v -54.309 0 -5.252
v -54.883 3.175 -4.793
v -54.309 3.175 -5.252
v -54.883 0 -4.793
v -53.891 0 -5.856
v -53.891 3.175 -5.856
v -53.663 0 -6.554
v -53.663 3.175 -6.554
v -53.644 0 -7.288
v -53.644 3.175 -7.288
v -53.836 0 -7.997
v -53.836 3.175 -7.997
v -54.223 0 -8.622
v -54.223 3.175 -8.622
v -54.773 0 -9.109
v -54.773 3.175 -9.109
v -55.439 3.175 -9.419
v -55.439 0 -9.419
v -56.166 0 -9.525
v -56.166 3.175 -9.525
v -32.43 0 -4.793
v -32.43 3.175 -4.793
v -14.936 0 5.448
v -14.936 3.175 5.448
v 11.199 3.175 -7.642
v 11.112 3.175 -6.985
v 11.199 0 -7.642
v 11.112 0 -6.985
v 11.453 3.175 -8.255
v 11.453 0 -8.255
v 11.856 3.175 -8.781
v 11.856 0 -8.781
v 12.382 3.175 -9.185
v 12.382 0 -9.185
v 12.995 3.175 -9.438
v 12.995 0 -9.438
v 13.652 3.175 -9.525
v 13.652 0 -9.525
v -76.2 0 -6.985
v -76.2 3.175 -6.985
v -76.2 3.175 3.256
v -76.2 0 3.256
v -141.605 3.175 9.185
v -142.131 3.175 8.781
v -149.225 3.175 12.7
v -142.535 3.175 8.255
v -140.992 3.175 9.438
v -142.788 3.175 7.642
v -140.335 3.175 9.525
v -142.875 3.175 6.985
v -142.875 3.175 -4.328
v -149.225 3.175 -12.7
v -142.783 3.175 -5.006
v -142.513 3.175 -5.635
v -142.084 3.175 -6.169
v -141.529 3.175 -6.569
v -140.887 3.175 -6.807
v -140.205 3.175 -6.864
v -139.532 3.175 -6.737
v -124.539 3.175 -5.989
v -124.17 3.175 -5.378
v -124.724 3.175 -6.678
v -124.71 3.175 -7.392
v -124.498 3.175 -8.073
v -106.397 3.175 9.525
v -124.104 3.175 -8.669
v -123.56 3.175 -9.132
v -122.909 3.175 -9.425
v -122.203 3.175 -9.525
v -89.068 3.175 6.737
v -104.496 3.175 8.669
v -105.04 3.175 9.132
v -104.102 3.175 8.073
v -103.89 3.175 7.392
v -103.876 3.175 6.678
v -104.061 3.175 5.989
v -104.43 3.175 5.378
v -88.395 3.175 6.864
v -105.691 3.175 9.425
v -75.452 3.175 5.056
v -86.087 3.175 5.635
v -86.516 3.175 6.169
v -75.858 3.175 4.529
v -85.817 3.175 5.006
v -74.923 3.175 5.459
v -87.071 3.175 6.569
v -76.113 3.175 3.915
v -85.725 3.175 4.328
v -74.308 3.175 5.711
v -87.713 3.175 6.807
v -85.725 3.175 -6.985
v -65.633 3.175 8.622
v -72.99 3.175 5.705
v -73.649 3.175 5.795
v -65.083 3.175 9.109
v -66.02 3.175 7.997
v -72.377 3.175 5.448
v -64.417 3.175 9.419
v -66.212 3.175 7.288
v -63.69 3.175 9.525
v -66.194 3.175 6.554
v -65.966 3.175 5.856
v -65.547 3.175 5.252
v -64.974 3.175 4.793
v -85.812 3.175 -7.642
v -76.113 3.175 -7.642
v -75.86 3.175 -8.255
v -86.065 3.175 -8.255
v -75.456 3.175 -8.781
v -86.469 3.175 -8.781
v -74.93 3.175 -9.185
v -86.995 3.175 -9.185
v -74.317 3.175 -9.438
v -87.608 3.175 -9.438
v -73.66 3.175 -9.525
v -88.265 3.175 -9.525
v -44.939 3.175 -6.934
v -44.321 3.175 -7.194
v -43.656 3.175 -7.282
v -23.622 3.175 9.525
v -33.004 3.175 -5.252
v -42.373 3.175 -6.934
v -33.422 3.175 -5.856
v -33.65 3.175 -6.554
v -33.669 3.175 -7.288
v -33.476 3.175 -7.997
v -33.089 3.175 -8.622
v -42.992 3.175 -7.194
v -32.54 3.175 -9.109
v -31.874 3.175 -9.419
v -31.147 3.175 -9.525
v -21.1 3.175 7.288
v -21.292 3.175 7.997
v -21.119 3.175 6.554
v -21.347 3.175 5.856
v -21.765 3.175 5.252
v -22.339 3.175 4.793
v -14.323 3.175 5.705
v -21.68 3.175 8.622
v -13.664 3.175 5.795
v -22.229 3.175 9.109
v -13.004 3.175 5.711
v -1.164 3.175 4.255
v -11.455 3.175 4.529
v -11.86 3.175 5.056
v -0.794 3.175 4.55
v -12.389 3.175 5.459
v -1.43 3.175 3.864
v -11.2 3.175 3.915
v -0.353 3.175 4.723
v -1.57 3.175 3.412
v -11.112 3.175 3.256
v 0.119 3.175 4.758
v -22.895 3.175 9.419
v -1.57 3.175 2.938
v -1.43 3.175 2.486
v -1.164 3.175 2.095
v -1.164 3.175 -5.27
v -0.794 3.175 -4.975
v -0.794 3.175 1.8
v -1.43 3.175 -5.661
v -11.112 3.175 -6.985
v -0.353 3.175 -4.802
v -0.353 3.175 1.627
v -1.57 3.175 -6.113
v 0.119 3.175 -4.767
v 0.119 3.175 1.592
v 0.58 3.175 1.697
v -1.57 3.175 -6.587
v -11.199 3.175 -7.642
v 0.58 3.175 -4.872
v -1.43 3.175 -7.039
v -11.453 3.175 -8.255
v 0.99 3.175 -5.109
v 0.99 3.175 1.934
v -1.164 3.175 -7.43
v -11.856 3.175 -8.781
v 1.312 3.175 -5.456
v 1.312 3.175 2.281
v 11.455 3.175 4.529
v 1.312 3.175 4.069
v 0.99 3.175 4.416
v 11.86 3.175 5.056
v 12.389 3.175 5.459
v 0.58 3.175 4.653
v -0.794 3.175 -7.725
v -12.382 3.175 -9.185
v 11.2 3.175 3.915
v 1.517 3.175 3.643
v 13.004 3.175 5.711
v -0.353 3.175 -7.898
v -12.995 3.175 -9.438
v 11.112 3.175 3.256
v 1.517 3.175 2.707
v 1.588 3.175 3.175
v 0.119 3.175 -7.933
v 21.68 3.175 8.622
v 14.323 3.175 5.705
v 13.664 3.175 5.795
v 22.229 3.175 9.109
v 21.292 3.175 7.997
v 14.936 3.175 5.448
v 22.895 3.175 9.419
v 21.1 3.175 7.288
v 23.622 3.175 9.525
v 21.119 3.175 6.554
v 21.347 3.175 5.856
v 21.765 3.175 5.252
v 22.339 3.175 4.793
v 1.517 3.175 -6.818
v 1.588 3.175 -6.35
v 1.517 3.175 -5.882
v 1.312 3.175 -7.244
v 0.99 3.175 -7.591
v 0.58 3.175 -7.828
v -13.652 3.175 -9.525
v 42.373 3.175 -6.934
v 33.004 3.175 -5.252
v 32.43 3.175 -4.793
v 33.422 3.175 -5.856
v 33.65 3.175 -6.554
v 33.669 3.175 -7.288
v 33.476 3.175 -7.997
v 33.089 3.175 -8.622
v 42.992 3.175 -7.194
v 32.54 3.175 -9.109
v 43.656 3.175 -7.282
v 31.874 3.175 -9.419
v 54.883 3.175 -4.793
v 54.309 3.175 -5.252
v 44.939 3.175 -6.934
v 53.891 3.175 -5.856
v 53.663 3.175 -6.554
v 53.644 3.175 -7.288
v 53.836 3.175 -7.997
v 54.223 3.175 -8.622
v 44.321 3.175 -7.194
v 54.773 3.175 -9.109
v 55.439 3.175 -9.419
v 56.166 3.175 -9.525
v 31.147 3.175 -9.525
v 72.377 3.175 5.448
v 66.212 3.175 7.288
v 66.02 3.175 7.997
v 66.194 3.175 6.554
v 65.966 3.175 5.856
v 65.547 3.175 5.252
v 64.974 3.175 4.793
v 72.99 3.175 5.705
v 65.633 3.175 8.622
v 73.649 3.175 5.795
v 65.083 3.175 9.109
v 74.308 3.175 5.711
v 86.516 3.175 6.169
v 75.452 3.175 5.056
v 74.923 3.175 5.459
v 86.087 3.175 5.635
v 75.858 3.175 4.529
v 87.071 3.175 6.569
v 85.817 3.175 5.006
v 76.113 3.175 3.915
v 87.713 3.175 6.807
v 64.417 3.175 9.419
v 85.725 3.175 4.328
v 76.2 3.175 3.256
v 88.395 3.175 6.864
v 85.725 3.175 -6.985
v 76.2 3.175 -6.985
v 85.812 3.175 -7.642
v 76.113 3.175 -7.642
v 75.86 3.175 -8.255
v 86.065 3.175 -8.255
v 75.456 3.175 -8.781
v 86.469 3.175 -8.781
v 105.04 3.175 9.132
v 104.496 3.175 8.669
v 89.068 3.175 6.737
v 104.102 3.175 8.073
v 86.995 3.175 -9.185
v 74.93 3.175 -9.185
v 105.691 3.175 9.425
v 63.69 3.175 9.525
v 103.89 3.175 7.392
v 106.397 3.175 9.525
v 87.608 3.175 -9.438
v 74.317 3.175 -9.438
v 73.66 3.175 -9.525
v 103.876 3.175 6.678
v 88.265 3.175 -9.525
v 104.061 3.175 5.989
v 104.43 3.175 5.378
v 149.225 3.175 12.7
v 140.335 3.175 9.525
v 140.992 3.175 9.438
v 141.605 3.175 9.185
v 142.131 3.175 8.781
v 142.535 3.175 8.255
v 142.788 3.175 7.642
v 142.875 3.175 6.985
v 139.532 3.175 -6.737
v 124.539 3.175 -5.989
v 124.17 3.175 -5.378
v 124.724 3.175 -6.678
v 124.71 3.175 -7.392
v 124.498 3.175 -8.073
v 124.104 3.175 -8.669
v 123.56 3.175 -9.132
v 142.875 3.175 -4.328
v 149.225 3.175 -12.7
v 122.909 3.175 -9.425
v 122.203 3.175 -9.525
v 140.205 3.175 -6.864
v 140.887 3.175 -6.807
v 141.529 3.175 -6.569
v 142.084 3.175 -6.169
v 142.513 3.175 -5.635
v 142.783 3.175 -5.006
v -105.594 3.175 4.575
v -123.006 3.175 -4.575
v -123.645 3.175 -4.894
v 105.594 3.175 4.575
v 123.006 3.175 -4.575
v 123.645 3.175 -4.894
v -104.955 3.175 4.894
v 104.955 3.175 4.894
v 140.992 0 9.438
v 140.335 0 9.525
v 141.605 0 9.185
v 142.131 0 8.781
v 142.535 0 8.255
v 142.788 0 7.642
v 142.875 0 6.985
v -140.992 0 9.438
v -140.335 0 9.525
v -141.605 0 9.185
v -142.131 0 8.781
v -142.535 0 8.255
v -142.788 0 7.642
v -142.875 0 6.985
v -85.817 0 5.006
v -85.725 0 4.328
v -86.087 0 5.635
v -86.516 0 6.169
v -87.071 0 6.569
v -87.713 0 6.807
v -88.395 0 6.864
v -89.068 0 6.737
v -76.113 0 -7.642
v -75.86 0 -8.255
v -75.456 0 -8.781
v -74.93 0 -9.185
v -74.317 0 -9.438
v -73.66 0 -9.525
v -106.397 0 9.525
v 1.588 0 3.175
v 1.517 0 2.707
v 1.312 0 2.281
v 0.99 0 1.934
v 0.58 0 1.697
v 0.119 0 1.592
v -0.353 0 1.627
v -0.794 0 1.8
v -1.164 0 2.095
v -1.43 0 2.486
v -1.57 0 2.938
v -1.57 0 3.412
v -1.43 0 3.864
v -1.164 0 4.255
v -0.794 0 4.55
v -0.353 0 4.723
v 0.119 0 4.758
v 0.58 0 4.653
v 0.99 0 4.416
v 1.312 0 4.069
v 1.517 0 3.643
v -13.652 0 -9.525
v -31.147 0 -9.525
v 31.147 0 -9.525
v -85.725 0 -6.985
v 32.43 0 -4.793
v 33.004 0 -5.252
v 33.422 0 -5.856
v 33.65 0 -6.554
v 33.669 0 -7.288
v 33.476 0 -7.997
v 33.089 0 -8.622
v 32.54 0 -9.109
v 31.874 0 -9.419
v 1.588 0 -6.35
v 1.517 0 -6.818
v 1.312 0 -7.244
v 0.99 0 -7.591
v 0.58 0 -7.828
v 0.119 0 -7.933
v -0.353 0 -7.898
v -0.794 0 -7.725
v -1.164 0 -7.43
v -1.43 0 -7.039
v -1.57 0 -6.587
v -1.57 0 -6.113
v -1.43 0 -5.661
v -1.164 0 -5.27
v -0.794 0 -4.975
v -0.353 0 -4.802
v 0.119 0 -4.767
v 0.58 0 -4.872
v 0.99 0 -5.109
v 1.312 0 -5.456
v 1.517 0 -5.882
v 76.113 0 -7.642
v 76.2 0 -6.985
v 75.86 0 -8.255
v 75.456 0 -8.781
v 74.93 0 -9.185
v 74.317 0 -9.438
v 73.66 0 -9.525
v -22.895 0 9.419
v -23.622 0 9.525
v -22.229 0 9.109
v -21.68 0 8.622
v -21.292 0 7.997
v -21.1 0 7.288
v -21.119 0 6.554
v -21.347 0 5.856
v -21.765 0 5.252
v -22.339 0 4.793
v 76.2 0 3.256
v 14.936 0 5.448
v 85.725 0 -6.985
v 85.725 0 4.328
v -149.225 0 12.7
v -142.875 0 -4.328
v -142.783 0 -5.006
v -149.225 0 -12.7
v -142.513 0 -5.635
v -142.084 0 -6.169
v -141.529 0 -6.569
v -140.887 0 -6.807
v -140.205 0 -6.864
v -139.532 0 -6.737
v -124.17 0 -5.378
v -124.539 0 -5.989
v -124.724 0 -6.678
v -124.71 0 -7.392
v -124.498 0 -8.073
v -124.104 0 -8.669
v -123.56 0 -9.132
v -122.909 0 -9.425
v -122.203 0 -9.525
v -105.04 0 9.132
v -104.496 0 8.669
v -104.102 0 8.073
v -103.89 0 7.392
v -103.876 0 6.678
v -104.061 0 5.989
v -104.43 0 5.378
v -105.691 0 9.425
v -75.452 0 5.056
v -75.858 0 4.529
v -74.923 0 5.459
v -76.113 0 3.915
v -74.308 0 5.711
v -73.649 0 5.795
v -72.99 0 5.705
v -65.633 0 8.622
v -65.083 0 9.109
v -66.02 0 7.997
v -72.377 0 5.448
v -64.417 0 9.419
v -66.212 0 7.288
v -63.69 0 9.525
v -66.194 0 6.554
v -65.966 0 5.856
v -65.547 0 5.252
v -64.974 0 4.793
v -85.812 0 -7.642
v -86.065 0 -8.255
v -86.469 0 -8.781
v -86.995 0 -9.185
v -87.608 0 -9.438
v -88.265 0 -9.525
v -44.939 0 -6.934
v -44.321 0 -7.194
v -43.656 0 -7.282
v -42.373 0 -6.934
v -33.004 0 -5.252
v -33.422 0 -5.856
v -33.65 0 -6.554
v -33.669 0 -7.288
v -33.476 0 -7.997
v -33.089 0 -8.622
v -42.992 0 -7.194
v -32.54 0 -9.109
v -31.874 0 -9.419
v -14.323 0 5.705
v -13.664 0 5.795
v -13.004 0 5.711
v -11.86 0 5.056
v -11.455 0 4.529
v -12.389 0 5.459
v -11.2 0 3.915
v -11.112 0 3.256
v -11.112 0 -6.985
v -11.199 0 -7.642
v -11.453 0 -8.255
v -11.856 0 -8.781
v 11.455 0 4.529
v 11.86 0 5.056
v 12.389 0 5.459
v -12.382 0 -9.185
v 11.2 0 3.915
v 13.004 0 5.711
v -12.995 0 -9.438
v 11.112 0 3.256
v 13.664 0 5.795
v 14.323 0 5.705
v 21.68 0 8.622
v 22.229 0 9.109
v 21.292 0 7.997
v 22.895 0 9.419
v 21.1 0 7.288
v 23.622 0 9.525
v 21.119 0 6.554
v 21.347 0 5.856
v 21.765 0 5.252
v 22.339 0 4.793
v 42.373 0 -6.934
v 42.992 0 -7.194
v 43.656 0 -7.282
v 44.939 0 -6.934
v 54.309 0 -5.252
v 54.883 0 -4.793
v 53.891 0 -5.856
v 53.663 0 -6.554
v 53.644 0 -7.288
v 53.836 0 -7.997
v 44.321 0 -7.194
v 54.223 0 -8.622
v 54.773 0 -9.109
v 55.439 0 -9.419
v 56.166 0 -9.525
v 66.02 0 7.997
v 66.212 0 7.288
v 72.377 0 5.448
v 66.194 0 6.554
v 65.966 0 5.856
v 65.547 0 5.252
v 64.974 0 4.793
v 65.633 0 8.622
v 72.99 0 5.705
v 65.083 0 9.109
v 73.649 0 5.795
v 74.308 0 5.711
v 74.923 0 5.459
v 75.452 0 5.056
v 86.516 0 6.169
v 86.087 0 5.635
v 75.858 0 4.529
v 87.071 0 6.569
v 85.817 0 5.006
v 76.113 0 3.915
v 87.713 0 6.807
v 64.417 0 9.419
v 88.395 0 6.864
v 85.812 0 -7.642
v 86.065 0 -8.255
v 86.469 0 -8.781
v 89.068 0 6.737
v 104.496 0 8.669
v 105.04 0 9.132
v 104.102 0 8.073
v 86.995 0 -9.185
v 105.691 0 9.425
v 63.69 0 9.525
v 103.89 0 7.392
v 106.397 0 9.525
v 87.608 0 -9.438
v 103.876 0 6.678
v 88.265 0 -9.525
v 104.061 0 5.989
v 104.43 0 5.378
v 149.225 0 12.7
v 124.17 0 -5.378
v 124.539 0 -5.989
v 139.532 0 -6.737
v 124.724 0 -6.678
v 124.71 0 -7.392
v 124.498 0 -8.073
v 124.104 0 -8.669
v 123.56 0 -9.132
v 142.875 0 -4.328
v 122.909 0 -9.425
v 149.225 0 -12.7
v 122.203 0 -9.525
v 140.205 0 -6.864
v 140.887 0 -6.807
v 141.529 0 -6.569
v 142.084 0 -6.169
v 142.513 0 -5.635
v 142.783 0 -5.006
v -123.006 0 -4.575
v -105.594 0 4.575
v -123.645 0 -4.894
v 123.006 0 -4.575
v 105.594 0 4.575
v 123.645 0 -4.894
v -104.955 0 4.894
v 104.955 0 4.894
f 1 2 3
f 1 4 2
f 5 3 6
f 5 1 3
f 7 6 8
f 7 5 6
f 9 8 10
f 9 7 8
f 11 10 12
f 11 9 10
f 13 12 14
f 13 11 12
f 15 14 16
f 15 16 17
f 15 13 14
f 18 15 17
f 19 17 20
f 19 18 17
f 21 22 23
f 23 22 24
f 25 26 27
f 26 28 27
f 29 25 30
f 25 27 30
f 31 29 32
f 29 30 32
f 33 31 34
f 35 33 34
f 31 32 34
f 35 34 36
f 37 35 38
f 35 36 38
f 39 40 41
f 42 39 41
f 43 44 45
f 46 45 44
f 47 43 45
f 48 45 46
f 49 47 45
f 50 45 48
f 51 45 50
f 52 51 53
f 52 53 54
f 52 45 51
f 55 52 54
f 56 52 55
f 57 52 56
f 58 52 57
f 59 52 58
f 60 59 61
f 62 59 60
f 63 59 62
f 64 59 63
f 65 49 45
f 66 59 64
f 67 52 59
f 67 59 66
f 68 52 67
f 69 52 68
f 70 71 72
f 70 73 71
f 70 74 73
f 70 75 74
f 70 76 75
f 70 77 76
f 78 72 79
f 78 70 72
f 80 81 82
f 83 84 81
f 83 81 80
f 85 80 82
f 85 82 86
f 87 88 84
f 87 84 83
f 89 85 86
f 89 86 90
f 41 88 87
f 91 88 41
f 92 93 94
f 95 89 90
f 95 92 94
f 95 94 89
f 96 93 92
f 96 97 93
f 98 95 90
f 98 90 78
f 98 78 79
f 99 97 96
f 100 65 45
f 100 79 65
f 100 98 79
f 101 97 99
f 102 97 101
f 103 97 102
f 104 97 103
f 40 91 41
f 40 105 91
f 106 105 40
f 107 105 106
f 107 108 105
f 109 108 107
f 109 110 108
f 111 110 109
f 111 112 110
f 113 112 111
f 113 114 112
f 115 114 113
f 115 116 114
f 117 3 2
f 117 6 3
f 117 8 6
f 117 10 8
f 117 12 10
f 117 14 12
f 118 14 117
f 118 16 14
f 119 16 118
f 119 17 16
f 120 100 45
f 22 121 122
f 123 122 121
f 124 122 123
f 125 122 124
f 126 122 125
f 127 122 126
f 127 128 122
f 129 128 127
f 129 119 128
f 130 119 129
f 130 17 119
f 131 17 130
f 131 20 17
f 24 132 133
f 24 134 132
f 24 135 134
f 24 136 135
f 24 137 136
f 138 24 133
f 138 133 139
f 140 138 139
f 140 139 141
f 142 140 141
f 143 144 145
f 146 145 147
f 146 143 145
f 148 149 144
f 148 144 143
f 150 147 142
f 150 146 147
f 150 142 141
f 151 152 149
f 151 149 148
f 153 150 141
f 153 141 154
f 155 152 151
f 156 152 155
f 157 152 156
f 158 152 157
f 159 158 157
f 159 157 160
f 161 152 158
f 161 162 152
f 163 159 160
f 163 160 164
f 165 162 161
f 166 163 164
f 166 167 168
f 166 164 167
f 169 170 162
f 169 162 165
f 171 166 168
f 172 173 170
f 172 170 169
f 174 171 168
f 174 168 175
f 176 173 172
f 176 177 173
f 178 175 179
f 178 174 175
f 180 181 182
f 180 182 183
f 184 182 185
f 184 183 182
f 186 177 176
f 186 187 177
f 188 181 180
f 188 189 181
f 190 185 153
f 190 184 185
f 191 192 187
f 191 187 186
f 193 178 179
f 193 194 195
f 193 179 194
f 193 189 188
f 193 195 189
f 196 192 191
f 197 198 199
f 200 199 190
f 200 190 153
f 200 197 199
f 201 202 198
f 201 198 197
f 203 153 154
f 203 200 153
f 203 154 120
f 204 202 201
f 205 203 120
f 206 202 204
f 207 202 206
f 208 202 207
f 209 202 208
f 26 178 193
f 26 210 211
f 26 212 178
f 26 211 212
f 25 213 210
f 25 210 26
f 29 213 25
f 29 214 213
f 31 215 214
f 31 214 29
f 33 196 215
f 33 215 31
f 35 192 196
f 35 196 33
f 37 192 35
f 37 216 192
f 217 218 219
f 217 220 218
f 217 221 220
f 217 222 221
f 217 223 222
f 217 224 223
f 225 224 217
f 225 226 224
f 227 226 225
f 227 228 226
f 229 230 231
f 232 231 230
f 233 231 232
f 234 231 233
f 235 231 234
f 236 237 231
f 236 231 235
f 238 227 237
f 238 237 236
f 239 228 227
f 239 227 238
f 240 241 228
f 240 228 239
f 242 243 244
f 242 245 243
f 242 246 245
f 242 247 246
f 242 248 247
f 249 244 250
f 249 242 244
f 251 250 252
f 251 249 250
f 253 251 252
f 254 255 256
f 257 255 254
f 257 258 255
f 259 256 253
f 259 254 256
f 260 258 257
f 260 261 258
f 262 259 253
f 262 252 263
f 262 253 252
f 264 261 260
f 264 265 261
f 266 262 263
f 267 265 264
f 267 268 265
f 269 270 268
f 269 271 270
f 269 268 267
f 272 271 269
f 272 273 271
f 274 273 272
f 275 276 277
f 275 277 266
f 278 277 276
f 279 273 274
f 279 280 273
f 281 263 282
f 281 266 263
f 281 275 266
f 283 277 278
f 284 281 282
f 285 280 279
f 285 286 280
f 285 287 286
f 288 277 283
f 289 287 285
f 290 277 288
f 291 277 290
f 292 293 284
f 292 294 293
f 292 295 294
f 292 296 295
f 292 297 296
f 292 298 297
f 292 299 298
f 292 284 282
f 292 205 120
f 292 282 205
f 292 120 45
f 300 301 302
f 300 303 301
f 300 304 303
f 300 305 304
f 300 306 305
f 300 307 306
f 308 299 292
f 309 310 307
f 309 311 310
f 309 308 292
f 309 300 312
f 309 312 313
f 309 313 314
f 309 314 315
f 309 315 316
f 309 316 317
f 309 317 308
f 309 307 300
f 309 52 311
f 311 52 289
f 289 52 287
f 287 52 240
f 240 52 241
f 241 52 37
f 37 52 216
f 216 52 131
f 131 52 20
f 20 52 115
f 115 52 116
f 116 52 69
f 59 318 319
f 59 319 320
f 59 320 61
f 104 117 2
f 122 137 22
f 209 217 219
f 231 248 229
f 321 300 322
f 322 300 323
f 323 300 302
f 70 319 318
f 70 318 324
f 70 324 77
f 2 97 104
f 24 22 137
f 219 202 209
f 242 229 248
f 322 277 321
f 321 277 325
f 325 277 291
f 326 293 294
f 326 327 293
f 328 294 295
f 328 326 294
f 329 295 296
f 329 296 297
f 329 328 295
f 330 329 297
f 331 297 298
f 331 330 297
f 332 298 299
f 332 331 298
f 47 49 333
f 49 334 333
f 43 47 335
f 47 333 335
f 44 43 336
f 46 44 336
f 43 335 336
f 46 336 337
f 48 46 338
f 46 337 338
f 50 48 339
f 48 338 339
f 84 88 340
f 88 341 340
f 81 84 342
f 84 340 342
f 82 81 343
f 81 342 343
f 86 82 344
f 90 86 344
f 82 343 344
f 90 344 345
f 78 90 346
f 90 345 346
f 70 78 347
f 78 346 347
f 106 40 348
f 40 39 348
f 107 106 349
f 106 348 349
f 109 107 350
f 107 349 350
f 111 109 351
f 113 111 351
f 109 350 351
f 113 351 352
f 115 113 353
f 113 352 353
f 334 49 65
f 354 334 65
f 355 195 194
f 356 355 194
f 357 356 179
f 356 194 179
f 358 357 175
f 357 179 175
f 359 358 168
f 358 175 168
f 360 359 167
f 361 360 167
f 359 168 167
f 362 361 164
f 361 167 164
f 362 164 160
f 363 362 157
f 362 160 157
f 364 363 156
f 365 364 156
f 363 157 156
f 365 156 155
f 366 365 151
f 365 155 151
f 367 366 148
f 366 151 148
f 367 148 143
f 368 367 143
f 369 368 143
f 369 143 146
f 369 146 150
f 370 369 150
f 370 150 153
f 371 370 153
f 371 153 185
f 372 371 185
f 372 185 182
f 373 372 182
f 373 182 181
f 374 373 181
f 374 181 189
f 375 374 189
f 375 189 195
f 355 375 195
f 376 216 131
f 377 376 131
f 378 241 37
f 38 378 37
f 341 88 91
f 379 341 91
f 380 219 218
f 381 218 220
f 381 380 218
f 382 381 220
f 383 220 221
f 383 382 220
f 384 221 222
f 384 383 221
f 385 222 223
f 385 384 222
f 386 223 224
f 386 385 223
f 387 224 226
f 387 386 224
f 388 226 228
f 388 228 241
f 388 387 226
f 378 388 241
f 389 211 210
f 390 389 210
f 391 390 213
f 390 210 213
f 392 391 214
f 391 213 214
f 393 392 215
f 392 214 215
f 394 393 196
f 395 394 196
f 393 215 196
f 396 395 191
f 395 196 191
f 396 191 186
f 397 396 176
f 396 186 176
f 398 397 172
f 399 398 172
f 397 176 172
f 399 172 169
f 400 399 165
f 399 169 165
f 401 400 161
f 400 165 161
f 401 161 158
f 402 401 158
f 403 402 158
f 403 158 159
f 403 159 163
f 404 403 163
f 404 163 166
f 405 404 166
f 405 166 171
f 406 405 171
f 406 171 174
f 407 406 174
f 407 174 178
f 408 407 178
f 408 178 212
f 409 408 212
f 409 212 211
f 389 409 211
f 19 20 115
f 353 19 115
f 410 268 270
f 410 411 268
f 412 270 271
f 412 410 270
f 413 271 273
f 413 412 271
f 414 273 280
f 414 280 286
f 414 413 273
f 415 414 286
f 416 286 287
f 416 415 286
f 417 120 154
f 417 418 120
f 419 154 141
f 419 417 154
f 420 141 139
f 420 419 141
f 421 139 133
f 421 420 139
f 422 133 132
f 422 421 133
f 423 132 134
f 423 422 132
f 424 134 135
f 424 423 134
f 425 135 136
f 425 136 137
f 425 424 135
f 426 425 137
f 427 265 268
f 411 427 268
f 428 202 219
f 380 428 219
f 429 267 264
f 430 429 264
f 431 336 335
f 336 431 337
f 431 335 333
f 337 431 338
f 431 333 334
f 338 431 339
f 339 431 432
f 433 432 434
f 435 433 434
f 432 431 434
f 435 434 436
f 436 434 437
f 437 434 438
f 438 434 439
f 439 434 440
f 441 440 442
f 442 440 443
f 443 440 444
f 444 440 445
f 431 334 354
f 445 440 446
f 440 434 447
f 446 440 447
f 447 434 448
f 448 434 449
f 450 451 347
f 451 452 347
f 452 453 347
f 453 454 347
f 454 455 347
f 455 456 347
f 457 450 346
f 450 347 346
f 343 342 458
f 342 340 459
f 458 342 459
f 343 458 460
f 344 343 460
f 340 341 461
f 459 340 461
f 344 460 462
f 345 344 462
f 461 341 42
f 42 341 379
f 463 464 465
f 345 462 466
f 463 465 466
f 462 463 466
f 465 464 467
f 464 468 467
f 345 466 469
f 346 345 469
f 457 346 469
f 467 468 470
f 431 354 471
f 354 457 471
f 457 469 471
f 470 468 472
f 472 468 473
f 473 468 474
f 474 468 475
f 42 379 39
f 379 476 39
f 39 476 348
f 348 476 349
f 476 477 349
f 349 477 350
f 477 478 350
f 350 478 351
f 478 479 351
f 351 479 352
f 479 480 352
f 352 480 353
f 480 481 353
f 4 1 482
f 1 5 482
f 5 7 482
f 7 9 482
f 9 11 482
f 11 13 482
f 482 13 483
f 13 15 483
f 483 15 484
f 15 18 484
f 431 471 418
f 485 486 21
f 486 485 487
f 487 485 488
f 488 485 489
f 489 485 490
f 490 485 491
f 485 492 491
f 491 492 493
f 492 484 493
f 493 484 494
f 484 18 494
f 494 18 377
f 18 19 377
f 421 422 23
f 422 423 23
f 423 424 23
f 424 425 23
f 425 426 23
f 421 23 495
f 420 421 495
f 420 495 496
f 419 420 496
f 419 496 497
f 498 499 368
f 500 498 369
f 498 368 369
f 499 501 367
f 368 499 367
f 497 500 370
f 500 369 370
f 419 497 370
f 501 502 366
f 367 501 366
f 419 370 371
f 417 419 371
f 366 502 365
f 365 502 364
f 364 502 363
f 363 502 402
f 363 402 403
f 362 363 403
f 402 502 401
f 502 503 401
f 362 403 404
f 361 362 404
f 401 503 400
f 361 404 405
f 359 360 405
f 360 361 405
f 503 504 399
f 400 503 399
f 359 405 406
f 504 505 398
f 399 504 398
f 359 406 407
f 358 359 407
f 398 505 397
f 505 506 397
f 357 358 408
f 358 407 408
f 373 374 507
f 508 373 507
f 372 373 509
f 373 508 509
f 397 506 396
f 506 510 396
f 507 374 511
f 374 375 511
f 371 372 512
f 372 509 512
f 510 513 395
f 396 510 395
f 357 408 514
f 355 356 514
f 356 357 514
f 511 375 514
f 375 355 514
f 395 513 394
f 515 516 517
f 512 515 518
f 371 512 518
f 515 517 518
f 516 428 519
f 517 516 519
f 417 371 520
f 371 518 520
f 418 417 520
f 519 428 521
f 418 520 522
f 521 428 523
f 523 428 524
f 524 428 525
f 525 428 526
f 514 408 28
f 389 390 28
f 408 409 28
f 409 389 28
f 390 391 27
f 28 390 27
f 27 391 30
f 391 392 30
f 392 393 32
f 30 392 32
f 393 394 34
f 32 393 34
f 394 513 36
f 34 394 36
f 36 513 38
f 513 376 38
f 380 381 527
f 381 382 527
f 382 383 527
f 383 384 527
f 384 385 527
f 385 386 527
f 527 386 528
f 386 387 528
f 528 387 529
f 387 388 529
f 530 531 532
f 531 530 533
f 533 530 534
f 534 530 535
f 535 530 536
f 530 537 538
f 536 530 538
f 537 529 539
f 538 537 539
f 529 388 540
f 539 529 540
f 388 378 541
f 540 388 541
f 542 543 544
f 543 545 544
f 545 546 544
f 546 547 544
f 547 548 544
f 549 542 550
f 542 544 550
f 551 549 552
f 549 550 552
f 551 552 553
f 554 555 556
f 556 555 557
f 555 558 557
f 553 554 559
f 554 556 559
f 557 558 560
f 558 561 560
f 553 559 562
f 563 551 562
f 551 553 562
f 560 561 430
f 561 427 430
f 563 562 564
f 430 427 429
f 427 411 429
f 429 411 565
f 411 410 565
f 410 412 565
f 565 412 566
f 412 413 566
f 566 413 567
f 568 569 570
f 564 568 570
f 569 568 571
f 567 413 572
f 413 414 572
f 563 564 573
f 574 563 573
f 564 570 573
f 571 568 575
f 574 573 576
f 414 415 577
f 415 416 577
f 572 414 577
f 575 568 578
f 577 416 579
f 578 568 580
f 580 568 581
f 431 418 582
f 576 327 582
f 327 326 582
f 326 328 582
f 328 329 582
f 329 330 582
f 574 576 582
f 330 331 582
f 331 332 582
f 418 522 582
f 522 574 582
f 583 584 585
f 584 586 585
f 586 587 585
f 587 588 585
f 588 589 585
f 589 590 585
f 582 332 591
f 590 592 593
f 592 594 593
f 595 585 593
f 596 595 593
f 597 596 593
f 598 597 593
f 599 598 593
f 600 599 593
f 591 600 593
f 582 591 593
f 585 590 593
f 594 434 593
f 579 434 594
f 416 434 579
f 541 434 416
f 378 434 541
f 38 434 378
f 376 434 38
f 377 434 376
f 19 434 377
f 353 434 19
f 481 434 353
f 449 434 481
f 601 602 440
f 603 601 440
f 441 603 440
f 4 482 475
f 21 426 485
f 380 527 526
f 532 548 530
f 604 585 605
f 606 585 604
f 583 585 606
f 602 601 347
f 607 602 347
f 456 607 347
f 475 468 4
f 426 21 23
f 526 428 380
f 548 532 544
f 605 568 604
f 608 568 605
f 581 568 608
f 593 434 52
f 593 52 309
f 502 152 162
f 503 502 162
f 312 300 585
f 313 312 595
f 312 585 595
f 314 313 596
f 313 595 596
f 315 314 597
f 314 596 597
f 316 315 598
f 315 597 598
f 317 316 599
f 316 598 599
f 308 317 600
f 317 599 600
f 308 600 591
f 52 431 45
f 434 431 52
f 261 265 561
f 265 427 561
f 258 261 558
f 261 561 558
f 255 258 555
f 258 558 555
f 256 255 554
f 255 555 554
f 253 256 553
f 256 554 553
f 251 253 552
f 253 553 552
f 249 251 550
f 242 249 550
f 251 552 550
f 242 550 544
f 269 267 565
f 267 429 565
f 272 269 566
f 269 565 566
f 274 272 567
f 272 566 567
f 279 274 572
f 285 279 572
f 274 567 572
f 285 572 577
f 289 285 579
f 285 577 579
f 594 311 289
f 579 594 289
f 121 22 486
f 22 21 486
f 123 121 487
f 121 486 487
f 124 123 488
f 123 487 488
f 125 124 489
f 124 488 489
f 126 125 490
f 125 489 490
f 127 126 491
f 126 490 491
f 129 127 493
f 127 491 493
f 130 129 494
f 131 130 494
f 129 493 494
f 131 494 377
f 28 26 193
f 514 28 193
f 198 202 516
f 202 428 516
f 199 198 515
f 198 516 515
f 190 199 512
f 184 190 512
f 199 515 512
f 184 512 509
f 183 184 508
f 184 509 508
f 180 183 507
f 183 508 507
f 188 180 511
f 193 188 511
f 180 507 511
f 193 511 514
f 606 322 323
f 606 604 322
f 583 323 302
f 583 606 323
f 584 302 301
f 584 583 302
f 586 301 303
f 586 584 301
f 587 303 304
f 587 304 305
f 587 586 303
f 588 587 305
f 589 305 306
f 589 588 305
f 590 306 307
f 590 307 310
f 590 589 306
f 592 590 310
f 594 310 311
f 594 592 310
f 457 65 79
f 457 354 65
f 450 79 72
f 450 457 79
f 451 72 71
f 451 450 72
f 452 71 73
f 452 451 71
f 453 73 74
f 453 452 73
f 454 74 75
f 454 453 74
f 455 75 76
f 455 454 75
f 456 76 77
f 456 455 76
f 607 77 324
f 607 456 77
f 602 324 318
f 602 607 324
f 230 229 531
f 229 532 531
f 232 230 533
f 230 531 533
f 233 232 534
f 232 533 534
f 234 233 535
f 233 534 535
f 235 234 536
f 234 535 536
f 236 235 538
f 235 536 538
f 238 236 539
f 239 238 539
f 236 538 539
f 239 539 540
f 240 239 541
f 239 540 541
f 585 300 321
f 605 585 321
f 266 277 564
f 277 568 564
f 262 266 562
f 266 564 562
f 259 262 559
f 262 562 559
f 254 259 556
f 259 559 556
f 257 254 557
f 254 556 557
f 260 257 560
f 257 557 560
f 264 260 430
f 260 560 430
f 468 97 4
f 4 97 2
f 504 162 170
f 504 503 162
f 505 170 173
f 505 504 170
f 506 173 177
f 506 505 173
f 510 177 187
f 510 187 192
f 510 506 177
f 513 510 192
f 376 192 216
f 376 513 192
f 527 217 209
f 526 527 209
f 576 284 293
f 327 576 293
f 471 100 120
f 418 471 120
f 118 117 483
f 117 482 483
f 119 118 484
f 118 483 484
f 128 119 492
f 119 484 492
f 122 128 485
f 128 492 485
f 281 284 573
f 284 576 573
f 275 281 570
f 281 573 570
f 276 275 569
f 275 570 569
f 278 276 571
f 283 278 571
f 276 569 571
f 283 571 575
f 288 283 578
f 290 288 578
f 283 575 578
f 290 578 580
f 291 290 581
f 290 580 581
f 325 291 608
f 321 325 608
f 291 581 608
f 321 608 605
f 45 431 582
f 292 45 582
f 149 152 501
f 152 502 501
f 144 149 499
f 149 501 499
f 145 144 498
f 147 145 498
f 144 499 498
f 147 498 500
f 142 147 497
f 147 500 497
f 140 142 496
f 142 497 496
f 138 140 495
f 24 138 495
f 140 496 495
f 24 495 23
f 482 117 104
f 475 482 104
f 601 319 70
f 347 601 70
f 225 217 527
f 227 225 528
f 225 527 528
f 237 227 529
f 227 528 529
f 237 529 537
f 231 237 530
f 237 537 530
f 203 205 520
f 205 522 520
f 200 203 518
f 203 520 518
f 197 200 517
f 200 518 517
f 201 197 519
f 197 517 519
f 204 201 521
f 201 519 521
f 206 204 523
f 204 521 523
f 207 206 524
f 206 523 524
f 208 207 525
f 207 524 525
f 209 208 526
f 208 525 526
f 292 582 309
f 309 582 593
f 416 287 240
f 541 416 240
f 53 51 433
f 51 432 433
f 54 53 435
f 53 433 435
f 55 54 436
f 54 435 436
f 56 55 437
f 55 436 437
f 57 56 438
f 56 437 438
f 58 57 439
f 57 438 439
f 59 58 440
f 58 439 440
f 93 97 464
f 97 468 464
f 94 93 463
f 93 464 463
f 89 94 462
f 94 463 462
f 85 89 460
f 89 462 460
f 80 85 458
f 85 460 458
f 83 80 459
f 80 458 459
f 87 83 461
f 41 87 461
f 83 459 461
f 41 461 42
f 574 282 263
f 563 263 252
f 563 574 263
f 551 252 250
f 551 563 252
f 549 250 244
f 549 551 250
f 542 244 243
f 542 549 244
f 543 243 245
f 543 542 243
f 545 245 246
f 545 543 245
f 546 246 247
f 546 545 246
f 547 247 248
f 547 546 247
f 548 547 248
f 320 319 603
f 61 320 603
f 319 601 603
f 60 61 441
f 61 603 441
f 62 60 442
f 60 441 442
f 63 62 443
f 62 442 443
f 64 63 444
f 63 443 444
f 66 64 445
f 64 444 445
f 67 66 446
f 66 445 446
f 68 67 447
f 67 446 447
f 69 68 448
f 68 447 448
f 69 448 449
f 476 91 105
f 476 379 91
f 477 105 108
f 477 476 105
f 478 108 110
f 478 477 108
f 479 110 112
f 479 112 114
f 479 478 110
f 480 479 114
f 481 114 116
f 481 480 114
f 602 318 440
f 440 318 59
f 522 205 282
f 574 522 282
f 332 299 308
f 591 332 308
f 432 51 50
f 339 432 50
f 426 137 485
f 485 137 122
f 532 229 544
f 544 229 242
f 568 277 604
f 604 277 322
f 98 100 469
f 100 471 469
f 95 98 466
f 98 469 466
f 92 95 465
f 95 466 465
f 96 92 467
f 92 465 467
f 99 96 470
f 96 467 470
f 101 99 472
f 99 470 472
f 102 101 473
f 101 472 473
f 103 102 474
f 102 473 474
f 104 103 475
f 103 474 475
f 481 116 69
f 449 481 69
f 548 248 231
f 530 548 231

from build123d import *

# Parameters (mm, degrees)
SKETCH1_W           = 298.45
SKETCH1_H           = 25.4
BOSS_EXTRUDE1_DEPTH = 3.175
CUT_EXTRUDE1_DEPTH  = 4.175
SKETCH3_R           = 1.5875
CUT_EXTRUDE2_DEPTH  = 4.175
FILLET1_R           = 2.54


with BuildPart() as part:
    # Sketch1 → Boss-Extrude1 (new body)
    with BuildSketch(Plane(origin=(0, 0, 0), x_dir=(1, 0, 0), z_dir=(0, 1, 0))):
        Rectangle(SKETCH1_W, SKETCH1_H)
    extrude(amount=BOSS_EXTRUDE1_DEPTH)

    # Sketch2 → Cut-Extrude1 (cut, through all)
    with BuildSketch(Plane(origin=(0, 3.175, 0), x_dir=(1, 0, 0), z_dir=(0, 1, 0))):
        Polygon((-142.875, -9.525), (-90.745115786, -9.525), (-142.875, 7.851628071), align=None)
        Polygon((-85.725, -7.851628071), (-85.725, 9.525), (-137.854884214, 9.525), align=None)
        Polygon((-76.2, -7.685517516), (-46.798699244, 9.525), (-76.2, 9.525), align=None)
        Polygon((-73.057550756, -9.525), (-14.254949244, -9.525), (-43.65625, 7.685517516), align=None)
        Polygon((-11.1125, -7.685517516), (-11.1125, 9.525), (-40.513800756, 9.525), align=None)
        Polygon((11.1125, -7.685517516), (40.513800756, 9.525), (11.1125, 9.525), align=None)
        Polygon((14.254949244, -9.525), (73.057550756, -9.525), (43.65625, 7.685517516), align=None)
        Polygon((76.2, -7.685517516), (76.2, 9.525), (46.798699244, 9.525), align=None)
        Polygon((85.725, -7.851628071), (137.854884214, 9.525), (85.725, 9.525), align=None)
        Polygon((90.745115786, -9.525), (142.875, -9.525), (142.875, 7.851628071), align=None)
    extrude(amount=-CUT_EXTRUDE1_DEPTH, mode=Mode.SUBTRACT)

    # Sketch3 → Cut-Extrude2 (cut, through all)
    with BuildSketch(Plane(origin=(0, 3.175, 0), x_dir=(1, 0, 0), z_dir=(0, 1, 0))):
        with Locations((0, 6.35)):
            Circle(SKETCH3_R)
        with Locations((0, -3.175)):
            Circle(SKETCH3_R)
    extrude(amount=-CUT_EXTRUDE2_DEPTH, mode=Mode.SUBTRACT)

    # Fillet1
    fillet1_edges = [part.edges().sort_by_distance(p)[0] for p in [
        (-43.65625, 1.5875, -7.685517516),
        (-14.254949244, 1.5875, 9.525),
        (-73.057550756, 1.5875, 9.525),
        (-40.513800756, 1.5875, -9.525),
        (-11.1125, 1.5875, -9.525),
        (-11.1125, 1.5875, 7.685517516),
        (-76.2, 1.5875, 7.685517516),
        (-76.2, 1.5875, -9.525),
        (-46.798699244, 1.5875, -9.525),
        (-85.725, 1.5875, 7.851628071),
        (-137.854884214, 1.5875, -9.525),
        (-85.725, 1.5875, -9.525),
        (85.725, 1.5875, 7.851628071),
        (85.725, 1.5875, -9.525),
        (137.854884214, 1.5875, -9.525),
        (46.798699244, 1.5875, -9.525),
        (76.2, 1.5875, -9.525),
        (76.2, 1.5875, 7.685517516),
        (11.1125, 1.5875, 7.685517516),
        (11.1125, 1.5875, -9.525),
        (40.513800756, 1.5875, -9.525),
        (43.65625, 1.5875, -7.685517516),
        (73.057550756, 1.5875, 9.525),
        (14.254949244, 1.5875, 9.525),
        (90.745115786, 1.5875, 9.525),
        (142.875, 1.5875, -7.851628071),
        (142.875, 1.5875, 9.525),
        (-90.745115786, 1.5875, 9.525),
        (-142.875, 1.5875, 9.525),
        (-142.875, 1.5875, -7.851628071),
    ]]
    fillet(fillet1_edges, radius=FILLET1_R)


solid = part.part
